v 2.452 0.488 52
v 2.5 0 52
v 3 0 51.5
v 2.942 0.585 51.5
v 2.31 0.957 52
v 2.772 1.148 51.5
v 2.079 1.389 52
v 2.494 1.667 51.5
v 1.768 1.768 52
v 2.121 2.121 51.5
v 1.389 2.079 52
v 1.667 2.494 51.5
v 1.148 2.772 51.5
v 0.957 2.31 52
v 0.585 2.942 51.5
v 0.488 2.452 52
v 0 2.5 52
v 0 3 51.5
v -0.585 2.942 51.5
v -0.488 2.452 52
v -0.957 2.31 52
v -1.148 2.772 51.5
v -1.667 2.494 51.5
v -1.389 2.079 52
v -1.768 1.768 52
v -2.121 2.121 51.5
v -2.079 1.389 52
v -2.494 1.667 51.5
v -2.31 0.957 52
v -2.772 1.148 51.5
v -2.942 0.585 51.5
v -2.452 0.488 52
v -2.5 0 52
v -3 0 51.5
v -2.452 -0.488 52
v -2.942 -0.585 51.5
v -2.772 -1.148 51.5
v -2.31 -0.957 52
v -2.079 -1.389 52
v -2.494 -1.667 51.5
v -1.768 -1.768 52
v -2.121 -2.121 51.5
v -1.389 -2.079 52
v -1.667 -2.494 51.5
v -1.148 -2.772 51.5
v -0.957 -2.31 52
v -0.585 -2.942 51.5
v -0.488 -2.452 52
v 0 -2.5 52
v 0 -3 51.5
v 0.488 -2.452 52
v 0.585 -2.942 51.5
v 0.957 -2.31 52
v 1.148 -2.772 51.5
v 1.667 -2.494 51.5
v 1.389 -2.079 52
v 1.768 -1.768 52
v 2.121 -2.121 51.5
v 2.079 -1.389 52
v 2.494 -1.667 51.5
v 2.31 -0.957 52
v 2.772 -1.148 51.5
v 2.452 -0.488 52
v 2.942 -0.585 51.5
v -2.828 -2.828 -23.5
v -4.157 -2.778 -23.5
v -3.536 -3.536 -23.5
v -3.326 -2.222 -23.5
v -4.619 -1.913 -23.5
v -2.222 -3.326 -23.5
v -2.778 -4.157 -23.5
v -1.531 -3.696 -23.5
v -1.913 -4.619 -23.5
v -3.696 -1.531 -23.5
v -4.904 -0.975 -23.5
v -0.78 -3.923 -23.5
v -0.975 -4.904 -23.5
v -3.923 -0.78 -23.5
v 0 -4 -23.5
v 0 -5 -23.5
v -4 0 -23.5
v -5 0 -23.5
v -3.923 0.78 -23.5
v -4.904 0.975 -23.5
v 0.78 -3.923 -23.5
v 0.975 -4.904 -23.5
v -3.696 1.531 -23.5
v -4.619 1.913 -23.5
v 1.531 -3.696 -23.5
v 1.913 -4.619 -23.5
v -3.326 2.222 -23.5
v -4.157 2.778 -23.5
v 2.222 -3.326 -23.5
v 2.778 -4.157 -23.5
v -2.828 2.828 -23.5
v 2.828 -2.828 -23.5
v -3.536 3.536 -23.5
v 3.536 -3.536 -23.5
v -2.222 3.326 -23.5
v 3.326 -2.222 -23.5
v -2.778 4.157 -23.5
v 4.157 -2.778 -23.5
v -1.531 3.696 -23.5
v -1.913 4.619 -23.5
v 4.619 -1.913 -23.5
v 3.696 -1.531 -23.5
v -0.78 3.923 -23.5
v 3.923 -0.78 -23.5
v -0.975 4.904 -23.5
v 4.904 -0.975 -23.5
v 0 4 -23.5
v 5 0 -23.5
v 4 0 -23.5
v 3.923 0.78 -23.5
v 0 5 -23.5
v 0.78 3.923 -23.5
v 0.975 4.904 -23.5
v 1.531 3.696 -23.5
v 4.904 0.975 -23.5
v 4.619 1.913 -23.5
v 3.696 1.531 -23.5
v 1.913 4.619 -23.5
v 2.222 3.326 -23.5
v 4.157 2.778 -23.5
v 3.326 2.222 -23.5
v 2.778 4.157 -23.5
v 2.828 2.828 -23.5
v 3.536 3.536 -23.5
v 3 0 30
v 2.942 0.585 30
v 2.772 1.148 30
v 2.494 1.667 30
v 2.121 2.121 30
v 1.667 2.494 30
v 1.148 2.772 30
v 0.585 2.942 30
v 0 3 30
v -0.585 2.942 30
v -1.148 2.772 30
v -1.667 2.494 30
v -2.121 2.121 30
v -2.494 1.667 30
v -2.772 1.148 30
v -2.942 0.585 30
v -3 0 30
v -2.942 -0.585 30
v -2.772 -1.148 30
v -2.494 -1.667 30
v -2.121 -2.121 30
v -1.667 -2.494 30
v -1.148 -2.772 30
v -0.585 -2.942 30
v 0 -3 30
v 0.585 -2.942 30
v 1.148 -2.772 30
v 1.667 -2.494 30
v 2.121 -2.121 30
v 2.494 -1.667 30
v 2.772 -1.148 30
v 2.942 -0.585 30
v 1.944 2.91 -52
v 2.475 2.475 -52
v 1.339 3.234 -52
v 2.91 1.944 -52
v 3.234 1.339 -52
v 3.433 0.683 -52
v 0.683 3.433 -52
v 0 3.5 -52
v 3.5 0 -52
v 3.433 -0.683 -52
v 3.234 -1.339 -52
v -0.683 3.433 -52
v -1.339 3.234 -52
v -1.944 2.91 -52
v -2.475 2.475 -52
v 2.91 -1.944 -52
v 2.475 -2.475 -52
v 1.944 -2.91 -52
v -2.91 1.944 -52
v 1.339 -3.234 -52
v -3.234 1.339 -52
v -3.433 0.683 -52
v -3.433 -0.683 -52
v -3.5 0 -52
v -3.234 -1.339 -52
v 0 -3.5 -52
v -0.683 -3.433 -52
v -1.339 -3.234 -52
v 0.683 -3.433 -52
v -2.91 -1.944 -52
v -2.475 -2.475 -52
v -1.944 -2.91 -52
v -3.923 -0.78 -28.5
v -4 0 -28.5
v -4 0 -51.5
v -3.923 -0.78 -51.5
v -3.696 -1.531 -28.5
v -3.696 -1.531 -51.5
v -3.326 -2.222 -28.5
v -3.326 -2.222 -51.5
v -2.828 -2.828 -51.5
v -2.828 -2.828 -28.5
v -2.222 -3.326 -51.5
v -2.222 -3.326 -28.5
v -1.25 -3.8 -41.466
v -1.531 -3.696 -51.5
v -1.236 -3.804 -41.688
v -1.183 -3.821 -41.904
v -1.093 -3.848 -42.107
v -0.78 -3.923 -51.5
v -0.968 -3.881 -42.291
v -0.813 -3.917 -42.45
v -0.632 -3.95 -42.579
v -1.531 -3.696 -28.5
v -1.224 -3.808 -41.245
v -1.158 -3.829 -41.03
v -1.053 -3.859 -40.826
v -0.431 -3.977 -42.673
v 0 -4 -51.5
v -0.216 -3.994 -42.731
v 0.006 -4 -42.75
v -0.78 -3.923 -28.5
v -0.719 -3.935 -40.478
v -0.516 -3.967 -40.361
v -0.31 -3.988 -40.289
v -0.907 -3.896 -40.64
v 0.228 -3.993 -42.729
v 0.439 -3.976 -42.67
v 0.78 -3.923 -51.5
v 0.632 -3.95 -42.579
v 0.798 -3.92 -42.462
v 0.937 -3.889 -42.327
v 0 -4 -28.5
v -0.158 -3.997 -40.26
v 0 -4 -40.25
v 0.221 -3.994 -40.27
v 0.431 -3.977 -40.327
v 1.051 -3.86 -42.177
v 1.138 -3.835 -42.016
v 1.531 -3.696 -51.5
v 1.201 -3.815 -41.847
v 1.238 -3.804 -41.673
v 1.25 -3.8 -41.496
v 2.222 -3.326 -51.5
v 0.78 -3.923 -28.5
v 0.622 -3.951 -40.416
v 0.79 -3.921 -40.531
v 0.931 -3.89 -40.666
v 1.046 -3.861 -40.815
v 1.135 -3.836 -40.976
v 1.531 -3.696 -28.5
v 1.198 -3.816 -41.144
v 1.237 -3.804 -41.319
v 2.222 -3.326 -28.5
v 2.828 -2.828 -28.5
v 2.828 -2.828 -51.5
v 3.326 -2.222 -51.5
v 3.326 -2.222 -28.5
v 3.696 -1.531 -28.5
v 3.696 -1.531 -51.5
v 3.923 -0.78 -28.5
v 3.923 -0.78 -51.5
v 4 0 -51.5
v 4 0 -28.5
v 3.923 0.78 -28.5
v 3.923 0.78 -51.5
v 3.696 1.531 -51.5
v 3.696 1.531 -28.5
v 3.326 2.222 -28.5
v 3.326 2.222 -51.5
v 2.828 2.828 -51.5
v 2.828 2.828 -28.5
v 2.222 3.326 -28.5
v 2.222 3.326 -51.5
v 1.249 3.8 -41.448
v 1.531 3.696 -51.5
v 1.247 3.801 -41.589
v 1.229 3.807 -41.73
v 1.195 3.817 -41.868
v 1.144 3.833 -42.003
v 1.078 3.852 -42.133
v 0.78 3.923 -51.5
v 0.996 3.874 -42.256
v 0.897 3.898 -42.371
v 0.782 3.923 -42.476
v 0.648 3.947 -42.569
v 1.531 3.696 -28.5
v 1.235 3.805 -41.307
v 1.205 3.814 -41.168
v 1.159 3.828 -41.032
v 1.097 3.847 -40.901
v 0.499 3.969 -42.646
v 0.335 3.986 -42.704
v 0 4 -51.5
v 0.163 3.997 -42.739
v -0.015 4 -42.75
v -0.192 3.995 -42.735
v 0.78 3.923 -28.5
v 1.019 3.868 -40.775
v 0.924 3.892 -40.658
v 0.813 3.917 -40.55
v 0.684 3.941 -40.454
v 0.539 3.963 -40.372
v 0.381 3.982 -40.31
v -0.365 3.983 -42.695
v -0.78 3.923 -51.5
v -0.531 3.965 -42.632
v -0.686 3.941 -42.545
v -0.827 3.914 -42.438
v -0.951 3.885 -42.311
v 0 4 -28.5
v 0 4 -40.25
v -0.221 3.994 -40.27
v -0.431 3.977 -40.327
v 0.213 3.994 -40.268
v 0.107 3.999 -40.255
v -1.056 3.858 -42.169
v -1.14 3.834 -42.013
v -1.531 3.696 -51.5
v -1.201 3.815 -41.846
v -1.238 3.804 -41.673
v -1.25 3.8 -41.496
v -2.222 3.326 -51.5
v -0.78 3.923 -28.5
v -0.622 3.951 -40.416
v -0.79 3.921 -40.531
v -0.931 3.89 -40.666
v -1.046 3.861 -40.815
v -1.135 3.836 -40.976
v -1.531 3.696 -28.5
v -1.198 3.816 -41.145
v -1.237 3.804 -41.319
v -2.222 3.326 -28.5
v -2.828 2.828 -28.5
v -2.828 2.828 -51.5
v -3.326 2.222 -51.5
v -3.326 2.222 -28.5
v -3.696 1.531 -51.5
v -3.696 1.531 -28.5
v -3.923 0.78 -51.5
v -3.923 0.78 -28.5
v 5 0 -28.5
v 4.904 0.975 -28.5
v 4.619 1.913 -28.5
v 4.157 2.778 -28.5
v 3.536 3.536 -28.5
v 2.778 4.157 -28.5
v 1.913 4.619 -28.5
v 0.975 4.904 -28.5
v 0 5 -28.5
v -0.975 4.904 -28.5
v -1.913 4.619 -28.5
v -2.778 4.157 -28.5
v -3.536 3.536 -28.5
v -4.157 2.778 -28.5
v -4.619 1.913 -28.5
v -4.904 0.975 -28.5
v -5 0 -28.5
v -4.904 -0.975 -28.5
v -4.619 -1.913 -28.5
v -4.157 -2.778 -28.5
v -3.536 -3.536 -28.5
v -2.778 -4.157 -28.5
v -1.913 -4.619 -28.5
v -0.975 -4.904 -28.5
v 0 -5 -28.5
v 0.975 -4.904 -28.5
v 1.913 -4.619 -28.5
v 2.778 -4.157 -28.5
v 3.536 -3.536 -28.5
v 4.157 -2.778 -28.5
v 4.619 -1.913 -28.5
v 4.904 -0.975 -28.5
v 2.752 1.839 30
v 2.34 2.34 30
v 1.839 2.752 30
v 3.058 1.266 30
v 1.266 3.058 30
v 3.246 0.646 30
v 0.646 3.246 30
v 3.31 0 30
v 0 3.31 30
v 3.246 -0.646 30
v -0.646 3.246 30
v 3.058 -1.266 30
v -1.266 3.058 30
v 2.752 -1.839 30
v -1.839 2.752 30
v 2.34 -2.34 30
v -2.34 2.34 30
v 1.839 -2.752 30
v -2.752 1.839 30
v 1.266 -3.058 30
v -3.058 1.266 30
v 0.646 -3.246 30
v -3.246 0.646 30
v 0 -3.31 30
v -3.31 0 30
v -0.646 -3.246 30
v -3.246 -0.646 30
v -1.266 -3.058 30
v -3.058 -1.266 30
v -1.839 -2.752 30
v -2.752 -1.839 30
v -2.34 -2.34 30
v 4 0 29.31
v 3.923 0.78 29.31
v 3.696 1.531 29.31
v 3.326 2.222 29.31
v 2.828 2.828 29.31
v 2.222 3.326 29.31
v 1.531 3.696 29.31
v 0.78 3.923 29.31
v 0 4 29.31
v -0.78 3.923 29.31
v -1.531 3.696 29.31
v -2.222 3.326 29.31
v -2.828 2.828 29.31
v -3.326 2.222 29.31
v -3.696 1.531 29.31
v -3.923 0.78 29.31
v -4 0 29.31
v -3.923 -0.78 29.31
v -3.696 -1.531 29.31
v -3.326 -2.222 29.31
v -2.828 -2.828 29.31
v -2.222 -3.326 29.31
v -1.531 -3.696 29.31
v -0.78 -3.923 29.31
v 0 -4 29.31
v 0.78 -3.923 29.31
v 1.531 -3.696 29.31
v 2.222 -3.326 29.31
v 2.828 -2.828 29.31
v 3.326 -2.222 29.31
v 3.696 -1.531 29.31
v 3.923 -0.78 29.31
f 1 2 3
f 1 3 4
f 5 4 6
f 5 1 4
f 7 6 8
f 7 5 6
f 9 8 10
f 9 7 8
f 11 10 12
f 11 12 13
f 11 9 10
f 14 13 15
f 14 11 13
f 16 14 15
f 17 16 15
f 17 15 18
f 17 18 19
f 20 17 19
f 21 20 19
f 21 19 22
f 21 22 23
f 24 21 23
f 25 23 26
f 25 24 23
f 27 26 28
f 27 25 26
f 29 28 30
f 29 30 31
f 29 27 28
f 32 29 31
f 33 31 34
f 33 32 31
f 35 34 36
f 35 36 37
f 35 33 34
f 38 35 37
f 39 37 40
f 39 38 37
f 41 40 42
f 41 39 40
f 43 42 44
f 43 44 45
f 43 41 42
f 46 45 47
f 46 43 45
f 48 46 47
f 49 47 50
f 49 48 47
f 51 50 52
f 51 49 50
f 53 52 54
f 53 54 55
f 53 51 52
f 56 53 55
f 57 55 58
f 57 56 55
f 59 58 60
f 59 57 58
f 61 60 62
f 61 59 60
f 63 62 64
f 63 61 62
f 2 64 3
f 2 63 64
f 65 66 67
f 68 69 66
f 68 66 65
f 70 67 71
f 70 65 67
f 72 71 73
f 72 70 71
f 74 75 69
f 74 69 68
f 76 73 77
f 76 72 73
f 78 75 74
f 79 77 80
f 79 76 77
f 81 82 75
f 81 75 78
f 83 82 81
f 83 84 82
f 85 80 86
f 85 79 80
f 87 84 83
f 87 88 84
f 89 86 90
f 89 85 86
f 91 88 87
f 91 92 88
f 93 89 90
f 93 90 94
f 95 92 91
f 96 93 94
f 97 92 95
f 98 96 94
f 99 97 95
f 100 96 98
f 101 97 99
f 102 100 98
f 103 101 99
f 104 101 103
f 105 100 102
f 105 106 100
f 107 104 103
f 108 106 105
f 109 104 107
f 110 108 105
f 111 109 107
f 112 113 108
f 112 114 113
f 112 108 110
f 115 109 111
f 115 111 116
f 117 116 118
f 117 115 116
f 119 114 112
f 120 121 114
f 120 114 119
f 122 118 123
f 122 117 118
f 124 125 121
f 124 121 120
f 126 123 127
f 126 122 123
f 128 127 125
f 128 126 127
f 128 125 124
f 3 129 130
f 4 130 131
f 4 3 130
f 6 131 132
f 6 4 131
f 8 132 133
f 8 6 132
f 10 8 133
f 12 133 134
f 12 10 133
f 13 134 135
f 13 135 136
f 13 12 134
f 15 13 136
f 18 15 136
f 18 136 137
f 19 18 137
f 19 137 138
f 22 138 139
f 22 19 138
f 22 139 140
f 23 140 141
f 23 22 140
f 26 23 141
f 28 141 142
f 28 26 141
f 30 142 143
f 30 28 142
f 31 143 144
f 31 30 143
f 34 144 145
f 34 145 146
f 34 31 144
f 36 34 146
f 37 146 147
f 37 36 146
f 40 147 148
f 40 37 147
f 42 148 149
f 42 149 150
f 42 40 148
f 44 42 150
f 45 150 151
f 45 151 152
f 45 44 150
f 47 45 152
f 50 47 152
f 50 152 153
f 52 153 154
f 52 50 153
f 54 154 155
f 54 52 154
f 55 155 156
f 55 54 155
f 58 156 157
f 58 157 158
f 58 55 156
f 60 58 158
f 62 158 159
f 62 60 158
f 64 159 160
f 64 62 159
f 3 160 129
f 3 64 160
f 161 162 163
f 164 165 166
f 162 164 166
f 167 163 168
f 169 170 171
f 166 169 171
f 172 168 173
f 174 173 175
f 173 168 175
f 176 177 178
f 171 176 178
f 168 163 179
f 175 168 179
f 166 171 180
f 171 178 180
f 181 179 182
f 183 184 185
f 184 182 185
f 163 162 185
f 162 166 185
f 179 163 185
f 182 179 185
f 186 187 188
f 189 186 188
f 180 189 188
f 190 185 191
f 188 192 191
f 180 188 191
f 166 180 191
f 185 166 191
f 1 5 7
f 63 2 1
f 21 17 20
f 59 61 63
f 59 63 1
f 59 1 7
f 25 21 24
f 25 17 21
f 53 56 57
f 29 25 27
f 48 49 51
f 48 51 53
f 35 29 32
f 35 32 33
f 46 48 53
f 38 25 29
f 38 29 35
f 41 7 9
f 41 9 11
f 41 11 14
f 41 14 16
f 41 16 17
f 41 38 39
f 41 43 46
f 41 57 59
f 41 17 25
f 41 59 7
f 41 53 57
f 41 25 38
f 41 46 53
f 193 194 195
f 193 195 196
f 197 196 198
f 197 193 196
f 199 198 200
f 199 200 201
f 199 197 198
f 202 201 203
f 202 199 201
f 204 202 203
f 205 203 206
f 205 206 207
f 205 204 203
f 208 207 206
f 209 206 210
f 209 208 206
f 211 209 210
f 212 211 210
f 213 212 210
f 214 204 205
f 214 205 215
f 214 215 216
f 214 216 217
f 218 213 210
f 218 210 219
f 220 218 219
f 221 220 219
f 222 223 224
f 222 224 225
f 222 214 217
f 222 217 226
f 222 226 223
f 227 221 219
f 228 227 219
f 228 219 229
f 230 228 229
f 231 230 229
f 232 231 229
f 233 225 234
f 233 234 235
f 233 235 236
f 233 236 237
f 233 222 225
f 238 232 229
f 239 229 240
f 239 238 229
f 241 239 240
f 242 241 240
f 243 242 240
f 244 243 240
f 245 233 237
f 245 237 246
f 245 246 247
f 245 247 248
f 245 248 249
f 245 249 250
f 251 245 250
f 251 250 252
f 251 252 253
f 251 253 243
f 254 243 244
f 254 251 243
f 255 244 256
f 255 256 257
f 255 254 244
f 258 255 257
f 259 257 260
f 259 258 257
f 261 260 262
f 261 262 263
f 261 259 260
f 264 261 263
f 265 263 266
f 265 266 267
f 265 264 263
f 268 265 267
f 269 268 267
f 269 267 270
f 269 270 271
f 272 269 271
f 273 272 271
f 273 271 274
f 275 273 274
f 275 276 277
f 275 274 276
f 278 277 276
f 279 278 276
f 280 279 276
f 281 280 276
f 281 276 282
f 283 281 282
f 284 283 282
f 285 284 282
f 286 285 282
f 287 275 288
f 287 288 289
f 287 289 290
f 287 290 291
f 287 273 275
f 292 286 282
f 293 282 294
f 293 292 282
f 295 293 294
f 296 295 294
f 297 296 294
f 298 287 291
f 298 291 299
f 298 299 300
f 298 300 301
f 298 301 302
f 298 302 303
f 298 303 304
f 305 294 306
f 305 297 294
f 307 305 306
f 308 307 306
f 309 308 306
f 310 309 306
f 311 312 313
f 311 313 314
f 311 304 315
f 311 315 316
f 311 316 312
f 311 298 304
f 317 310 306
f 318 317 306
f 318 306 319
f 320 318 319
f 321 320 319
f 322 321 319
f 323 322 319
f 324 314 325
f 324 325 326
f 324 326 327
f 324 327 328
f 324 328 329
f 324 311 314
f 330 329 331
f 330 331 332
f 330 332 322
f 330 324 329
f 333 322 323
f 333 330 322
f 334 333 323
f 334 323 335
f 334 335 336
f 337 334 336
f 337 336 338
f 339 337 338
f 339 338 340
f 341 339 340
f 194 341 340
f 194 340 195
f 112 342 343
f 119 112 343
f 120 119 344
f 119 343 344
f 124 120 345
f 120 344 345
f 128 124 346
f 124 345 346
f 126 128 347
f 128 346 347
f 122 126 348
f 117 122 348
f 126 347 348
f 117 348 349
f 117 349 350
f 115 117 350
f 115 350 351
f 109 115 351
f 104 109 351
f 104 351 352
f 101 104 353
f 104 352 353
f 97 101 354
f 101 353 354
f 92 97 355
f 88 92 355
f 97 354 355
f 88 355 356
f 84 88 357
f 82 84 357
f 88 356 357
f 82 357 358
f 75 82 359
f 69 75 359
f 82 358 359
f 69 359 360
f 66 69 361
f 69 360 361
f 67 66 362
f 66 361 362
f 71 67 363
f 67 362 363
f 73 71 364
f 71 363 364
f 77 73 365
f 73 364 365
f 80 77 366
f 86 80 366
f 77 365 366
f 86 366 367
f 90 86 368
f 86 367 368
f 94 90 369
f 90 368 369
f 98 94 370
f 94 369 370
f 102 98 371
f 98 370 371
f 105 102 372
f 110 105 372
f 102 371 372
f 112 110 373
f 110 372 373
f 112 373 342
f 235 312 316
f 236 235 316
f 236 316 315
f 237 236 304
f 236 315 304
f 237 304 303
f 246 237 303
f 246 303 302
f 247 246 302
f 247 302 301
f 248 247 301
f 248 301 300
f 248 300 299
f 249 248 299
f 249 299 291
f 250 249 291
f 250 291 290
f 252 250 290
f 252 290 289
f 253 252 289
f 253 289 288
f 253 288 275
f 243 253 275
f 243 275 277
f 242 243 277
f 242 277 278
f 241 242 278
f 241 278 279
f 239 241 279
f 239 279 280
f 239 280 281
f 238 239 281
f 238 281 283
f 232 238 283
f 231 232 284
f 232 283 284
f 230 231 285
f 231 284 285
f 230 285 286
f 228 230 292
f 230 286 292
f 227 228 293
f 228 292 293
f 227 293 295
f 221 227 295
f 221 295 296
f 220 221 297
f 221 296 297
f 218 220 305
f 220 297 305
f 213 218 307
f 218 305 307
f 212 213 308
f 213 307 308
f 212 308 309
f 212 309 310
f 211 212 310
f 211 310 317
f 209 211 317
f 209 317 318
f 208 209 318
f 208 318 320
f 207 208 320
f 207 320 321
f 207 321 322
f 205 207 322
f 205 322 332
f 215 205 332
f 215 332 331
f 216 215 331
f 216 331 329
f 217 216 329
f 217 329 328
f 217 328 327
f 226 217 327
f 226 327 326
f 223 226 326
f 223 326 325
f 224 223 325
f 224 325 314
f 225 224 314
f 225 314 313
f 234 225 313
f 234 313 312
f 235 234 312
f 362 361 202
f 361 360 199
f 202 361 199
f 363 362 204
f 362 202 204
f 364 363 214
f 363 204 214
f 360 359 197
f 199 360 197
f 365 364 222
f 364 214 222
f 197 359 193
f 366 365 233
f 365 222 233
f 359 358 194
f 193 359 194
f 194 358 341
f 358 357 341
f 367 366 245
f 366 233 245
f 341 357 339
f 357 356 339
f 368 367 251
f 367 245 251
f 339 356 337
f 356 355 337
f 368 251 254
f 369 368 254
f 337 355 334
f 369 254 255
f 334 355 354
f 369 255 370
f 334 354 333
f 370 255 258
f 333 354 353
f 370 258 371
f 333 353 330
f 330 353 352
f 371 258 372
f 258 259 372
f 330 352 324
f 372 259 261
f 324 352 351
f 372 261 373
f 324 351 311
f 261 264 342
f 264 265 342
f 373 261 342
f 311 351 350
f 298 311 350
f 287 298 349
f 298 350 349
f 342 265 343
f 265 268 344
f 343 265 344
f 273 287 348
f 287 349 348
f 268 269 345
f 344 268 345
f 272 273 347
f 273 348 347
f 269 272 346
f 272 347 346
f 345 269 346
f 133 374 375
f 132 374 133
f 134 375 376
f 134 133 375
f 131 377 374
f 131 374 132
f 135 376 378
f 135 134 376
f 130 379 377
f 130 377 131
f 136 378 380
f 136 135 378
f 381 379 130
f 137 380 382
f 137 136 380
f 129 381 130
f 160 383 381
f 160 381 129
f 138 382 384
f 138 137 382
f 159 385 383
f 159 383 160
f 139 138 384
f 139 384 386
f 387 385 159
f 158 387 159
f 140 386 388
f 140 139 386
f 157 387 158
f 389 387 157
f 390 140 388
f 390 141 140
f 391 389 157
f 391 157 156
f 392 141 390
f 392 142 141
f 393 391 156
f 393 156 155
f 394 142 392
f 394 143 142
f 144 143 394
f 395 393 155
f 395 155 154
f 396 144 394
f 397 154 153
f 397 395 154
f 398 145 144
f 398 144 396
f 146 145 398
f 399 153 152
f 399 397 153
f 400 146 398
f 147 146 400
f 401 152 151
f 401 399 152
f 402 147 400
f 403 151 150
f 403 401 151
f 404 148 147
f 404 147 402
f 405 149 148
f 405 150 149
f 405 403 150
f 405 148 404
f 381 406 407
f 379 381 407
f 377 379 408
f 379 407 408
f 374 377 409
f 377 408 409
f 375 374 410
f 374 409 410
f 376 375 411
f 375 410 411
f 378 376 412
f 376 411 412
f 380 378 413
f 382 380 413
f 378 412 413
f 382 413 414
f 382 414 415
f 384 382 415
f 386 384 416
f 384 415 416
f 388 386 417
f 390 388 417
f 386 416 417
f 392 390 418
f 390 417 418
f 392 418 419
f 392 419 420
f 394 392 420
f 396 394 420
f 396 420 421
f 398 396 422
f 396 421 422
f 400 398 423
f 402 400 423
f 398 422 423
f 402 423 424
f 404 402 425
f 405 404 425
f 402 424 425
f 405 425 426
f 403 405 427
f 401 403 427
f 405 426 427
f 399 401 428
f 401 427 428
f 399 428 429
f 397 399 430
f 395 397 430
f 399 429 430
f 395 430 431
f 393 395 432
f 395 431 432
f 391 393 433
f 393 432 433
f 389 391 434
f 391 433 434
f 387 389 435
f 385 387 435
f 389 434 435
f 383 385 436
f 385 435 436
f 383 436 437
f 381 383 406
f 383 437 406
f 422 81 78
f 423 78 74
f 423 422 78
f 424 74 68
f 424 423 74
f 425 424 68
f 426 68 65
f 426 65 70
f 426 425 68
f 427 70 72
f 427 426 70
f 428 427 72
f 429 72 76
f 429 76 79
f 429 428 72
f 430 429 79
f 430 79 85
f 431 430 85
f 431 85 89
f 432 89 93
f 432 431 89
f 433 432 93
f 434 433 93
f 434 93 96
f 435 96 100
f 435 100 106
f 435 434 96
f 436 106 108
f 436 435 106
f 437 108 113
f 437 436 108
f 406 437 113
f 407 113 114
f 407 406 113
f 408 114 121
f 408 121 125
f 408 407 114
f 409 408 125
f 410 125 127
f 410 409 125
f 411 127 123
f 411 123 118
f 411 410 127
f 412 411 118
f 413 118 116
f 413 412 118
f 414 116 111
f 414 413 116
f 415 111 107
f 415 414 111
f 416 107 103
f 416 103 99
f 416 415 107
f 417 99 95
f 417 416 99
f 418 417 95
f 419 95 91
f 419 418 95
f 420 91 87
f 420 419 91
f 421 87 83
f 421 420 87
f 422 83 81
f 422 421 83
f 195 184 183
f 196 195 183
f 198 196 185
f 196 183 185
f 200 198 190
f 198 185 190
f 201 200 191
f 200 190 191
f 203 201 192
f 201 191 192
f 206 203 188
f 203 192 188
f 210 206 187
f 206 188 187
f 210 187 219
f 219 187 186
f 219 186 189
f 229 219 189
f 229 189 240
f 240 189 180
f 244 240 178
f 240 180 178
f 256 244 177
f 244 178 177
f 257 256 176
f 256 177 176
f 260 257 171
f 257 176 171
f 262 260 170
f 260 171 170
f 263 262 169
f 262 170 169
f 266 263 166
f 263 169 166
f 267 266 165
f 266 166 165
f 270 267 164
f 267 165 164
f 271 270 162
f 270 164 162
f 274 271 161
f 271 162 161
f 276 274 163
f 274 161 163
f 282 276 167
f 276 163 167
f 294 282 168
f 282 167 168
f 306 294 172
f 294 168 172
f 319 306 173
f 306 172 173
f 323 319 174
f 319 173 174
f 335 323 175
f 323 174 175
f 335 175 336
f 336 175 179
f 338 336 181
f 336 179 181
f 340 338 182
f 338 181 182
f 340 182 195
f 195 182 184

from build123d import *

# Parameters (mm, degrees)
CROQUIS1_R              = 4
SALIENTE_EXTRUIR1_DEPTH = 52
CROQUIS2_R              = 5
SALIENTE_EXTRUIR2_DEPTH = 5
CROQUIS3_R              = 4
CROQUIS3_R_2            = 3
CORTAR_EXTRUIR1_DEPTH   = 22
CROQUIS5_R              = 1.25
CORTAR_EXTRUIR2_DEPTH   = 54.009433123
CHAFL_N1_SIZE           = 0.5


# Read off the part's stored shape, not the designer's step: M8 Roscas Standard Taladro1
with BuildPart() as part:
    # Croquis1 → Saliente-Extruir1 (new, symmetric)
    with BuildSketch(Plane.XY):
        with Locations(Location((0, 0, 0), (0, 0, 180))):
            Circle(CROQUIS1_R)
    extrude(amount=SALIENTE_EXTRUIR1_DEPTH, both=True)

    # Croquis2 → Saliente-Extruir2 (add)
    with BuildSketch(Plane.XY.offset(-28.5)):
        Circle(CROQUIS2_R)
    extrude(amount=SALIENTE_EXTRUIR2_DEPTH)

    # Croquis3 → Cortar-Extruir1 (cut)
    with BuildSketch(Plane.XY.offset(52)):
        with Locations(Location((0, 0, 0), (0, 0, 180))):
            Circle(CROQUIS3_R)
        Circle(CROQUIS3_R_2, mode=Mode.SUBTRACT)
    extrude(amount=-CORTAR_EXTRUIR1_DEPTH, mode=Mode.SUBTRACT)

    # M8 Roscas Standard Taladro1 outline → M8 Roscas Standard Taladro1 (revolve, cut)
    with BuildSketch(Plane.XZ):
        Polygon((4, 30), (3.3095, 30), (4, 29.3095), align=None)
    revolve(axis=Axis((0, 0, 0), (0, 0, 1)), mode=Mode.SUBTRACT)

    # Croquis5 → Cortar-Extruir2 (cut, through all)
    with BuildSketch(Plane(origin=(0, 4, 0), x_dir=(1, 0, 0), z_dir=(0, 1, 0))):
        with Locations(Location((0, 41.5, 0), (0, 0, 270))):
            Circle(CROQUIS5_R)
    extrude(amount=-CORTAR_EXTRUIR2_DEPTH, mode=Mode.SUBTRACT)

    # Chaflán1
    chafl_n1_edges = [part.edges().sort_by_distance(p)[0] for p in [
        (-3, 0, 52),
        (4, 0, -52),
    ]]
    chamfer(chafl_n1_edges, length=CHAFL_N1_SIZE)


solid = part.part
